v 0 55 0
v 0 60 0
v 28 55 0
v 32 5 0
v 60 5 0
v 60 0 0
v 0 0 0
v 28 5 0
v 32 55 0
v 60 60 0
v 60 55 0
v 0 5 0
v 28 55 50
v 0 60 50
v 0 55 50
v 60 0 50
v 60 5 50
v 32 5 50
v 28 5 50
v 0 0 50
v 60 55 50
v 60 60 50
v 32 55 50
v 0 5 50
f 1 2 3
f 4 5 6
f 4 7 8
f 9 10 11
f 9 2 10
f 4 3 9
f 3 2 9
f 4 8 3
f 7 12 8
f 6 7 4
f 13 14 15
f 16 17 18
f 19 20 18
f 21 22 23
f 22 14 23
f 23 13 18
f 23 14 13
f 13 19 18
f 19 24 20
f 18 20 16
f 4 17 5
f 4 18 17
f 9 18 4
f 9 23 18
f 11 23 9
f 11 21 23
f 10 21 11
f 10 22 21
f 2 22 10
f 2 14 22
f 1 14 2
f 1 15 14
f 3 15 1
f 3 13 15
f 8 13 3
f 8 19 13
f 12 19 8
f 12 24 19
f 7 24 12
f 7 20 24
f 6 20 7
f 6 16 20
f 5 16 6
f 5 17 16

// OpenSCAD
$fn = 32;

// ----------------------------------------------------------------------
// Structural section: ibeam 60 x 60 mm
// ----------------------------------------------------------------------

// --- parameters (mm) ---
sec_w = 60;               // section width, X
sec_h = 60;               // section height, Y
flange_t = 5;             // flange thickness
web_t = 4;                // web thickness
plate_t = 50;             // cut length, Z (extrusion height)
fit_tol = 0.1;            // declared fit tolerance (prompt contract)
free_tol = 0.5;           // declared free tolerance (prompt contract)

profile = [[0, 0], [60, 0], [60, 5], [32, 5], [32, 55], [60, 55], [60, 60], [0, 60], [0, 55], [28, 55], [28, 5], [0, 5]];  // primary outline, 12 points, counter clockwise

// --- the one profile operation ---
linear_extrude(height = plate_t) polygon(points = profile);
